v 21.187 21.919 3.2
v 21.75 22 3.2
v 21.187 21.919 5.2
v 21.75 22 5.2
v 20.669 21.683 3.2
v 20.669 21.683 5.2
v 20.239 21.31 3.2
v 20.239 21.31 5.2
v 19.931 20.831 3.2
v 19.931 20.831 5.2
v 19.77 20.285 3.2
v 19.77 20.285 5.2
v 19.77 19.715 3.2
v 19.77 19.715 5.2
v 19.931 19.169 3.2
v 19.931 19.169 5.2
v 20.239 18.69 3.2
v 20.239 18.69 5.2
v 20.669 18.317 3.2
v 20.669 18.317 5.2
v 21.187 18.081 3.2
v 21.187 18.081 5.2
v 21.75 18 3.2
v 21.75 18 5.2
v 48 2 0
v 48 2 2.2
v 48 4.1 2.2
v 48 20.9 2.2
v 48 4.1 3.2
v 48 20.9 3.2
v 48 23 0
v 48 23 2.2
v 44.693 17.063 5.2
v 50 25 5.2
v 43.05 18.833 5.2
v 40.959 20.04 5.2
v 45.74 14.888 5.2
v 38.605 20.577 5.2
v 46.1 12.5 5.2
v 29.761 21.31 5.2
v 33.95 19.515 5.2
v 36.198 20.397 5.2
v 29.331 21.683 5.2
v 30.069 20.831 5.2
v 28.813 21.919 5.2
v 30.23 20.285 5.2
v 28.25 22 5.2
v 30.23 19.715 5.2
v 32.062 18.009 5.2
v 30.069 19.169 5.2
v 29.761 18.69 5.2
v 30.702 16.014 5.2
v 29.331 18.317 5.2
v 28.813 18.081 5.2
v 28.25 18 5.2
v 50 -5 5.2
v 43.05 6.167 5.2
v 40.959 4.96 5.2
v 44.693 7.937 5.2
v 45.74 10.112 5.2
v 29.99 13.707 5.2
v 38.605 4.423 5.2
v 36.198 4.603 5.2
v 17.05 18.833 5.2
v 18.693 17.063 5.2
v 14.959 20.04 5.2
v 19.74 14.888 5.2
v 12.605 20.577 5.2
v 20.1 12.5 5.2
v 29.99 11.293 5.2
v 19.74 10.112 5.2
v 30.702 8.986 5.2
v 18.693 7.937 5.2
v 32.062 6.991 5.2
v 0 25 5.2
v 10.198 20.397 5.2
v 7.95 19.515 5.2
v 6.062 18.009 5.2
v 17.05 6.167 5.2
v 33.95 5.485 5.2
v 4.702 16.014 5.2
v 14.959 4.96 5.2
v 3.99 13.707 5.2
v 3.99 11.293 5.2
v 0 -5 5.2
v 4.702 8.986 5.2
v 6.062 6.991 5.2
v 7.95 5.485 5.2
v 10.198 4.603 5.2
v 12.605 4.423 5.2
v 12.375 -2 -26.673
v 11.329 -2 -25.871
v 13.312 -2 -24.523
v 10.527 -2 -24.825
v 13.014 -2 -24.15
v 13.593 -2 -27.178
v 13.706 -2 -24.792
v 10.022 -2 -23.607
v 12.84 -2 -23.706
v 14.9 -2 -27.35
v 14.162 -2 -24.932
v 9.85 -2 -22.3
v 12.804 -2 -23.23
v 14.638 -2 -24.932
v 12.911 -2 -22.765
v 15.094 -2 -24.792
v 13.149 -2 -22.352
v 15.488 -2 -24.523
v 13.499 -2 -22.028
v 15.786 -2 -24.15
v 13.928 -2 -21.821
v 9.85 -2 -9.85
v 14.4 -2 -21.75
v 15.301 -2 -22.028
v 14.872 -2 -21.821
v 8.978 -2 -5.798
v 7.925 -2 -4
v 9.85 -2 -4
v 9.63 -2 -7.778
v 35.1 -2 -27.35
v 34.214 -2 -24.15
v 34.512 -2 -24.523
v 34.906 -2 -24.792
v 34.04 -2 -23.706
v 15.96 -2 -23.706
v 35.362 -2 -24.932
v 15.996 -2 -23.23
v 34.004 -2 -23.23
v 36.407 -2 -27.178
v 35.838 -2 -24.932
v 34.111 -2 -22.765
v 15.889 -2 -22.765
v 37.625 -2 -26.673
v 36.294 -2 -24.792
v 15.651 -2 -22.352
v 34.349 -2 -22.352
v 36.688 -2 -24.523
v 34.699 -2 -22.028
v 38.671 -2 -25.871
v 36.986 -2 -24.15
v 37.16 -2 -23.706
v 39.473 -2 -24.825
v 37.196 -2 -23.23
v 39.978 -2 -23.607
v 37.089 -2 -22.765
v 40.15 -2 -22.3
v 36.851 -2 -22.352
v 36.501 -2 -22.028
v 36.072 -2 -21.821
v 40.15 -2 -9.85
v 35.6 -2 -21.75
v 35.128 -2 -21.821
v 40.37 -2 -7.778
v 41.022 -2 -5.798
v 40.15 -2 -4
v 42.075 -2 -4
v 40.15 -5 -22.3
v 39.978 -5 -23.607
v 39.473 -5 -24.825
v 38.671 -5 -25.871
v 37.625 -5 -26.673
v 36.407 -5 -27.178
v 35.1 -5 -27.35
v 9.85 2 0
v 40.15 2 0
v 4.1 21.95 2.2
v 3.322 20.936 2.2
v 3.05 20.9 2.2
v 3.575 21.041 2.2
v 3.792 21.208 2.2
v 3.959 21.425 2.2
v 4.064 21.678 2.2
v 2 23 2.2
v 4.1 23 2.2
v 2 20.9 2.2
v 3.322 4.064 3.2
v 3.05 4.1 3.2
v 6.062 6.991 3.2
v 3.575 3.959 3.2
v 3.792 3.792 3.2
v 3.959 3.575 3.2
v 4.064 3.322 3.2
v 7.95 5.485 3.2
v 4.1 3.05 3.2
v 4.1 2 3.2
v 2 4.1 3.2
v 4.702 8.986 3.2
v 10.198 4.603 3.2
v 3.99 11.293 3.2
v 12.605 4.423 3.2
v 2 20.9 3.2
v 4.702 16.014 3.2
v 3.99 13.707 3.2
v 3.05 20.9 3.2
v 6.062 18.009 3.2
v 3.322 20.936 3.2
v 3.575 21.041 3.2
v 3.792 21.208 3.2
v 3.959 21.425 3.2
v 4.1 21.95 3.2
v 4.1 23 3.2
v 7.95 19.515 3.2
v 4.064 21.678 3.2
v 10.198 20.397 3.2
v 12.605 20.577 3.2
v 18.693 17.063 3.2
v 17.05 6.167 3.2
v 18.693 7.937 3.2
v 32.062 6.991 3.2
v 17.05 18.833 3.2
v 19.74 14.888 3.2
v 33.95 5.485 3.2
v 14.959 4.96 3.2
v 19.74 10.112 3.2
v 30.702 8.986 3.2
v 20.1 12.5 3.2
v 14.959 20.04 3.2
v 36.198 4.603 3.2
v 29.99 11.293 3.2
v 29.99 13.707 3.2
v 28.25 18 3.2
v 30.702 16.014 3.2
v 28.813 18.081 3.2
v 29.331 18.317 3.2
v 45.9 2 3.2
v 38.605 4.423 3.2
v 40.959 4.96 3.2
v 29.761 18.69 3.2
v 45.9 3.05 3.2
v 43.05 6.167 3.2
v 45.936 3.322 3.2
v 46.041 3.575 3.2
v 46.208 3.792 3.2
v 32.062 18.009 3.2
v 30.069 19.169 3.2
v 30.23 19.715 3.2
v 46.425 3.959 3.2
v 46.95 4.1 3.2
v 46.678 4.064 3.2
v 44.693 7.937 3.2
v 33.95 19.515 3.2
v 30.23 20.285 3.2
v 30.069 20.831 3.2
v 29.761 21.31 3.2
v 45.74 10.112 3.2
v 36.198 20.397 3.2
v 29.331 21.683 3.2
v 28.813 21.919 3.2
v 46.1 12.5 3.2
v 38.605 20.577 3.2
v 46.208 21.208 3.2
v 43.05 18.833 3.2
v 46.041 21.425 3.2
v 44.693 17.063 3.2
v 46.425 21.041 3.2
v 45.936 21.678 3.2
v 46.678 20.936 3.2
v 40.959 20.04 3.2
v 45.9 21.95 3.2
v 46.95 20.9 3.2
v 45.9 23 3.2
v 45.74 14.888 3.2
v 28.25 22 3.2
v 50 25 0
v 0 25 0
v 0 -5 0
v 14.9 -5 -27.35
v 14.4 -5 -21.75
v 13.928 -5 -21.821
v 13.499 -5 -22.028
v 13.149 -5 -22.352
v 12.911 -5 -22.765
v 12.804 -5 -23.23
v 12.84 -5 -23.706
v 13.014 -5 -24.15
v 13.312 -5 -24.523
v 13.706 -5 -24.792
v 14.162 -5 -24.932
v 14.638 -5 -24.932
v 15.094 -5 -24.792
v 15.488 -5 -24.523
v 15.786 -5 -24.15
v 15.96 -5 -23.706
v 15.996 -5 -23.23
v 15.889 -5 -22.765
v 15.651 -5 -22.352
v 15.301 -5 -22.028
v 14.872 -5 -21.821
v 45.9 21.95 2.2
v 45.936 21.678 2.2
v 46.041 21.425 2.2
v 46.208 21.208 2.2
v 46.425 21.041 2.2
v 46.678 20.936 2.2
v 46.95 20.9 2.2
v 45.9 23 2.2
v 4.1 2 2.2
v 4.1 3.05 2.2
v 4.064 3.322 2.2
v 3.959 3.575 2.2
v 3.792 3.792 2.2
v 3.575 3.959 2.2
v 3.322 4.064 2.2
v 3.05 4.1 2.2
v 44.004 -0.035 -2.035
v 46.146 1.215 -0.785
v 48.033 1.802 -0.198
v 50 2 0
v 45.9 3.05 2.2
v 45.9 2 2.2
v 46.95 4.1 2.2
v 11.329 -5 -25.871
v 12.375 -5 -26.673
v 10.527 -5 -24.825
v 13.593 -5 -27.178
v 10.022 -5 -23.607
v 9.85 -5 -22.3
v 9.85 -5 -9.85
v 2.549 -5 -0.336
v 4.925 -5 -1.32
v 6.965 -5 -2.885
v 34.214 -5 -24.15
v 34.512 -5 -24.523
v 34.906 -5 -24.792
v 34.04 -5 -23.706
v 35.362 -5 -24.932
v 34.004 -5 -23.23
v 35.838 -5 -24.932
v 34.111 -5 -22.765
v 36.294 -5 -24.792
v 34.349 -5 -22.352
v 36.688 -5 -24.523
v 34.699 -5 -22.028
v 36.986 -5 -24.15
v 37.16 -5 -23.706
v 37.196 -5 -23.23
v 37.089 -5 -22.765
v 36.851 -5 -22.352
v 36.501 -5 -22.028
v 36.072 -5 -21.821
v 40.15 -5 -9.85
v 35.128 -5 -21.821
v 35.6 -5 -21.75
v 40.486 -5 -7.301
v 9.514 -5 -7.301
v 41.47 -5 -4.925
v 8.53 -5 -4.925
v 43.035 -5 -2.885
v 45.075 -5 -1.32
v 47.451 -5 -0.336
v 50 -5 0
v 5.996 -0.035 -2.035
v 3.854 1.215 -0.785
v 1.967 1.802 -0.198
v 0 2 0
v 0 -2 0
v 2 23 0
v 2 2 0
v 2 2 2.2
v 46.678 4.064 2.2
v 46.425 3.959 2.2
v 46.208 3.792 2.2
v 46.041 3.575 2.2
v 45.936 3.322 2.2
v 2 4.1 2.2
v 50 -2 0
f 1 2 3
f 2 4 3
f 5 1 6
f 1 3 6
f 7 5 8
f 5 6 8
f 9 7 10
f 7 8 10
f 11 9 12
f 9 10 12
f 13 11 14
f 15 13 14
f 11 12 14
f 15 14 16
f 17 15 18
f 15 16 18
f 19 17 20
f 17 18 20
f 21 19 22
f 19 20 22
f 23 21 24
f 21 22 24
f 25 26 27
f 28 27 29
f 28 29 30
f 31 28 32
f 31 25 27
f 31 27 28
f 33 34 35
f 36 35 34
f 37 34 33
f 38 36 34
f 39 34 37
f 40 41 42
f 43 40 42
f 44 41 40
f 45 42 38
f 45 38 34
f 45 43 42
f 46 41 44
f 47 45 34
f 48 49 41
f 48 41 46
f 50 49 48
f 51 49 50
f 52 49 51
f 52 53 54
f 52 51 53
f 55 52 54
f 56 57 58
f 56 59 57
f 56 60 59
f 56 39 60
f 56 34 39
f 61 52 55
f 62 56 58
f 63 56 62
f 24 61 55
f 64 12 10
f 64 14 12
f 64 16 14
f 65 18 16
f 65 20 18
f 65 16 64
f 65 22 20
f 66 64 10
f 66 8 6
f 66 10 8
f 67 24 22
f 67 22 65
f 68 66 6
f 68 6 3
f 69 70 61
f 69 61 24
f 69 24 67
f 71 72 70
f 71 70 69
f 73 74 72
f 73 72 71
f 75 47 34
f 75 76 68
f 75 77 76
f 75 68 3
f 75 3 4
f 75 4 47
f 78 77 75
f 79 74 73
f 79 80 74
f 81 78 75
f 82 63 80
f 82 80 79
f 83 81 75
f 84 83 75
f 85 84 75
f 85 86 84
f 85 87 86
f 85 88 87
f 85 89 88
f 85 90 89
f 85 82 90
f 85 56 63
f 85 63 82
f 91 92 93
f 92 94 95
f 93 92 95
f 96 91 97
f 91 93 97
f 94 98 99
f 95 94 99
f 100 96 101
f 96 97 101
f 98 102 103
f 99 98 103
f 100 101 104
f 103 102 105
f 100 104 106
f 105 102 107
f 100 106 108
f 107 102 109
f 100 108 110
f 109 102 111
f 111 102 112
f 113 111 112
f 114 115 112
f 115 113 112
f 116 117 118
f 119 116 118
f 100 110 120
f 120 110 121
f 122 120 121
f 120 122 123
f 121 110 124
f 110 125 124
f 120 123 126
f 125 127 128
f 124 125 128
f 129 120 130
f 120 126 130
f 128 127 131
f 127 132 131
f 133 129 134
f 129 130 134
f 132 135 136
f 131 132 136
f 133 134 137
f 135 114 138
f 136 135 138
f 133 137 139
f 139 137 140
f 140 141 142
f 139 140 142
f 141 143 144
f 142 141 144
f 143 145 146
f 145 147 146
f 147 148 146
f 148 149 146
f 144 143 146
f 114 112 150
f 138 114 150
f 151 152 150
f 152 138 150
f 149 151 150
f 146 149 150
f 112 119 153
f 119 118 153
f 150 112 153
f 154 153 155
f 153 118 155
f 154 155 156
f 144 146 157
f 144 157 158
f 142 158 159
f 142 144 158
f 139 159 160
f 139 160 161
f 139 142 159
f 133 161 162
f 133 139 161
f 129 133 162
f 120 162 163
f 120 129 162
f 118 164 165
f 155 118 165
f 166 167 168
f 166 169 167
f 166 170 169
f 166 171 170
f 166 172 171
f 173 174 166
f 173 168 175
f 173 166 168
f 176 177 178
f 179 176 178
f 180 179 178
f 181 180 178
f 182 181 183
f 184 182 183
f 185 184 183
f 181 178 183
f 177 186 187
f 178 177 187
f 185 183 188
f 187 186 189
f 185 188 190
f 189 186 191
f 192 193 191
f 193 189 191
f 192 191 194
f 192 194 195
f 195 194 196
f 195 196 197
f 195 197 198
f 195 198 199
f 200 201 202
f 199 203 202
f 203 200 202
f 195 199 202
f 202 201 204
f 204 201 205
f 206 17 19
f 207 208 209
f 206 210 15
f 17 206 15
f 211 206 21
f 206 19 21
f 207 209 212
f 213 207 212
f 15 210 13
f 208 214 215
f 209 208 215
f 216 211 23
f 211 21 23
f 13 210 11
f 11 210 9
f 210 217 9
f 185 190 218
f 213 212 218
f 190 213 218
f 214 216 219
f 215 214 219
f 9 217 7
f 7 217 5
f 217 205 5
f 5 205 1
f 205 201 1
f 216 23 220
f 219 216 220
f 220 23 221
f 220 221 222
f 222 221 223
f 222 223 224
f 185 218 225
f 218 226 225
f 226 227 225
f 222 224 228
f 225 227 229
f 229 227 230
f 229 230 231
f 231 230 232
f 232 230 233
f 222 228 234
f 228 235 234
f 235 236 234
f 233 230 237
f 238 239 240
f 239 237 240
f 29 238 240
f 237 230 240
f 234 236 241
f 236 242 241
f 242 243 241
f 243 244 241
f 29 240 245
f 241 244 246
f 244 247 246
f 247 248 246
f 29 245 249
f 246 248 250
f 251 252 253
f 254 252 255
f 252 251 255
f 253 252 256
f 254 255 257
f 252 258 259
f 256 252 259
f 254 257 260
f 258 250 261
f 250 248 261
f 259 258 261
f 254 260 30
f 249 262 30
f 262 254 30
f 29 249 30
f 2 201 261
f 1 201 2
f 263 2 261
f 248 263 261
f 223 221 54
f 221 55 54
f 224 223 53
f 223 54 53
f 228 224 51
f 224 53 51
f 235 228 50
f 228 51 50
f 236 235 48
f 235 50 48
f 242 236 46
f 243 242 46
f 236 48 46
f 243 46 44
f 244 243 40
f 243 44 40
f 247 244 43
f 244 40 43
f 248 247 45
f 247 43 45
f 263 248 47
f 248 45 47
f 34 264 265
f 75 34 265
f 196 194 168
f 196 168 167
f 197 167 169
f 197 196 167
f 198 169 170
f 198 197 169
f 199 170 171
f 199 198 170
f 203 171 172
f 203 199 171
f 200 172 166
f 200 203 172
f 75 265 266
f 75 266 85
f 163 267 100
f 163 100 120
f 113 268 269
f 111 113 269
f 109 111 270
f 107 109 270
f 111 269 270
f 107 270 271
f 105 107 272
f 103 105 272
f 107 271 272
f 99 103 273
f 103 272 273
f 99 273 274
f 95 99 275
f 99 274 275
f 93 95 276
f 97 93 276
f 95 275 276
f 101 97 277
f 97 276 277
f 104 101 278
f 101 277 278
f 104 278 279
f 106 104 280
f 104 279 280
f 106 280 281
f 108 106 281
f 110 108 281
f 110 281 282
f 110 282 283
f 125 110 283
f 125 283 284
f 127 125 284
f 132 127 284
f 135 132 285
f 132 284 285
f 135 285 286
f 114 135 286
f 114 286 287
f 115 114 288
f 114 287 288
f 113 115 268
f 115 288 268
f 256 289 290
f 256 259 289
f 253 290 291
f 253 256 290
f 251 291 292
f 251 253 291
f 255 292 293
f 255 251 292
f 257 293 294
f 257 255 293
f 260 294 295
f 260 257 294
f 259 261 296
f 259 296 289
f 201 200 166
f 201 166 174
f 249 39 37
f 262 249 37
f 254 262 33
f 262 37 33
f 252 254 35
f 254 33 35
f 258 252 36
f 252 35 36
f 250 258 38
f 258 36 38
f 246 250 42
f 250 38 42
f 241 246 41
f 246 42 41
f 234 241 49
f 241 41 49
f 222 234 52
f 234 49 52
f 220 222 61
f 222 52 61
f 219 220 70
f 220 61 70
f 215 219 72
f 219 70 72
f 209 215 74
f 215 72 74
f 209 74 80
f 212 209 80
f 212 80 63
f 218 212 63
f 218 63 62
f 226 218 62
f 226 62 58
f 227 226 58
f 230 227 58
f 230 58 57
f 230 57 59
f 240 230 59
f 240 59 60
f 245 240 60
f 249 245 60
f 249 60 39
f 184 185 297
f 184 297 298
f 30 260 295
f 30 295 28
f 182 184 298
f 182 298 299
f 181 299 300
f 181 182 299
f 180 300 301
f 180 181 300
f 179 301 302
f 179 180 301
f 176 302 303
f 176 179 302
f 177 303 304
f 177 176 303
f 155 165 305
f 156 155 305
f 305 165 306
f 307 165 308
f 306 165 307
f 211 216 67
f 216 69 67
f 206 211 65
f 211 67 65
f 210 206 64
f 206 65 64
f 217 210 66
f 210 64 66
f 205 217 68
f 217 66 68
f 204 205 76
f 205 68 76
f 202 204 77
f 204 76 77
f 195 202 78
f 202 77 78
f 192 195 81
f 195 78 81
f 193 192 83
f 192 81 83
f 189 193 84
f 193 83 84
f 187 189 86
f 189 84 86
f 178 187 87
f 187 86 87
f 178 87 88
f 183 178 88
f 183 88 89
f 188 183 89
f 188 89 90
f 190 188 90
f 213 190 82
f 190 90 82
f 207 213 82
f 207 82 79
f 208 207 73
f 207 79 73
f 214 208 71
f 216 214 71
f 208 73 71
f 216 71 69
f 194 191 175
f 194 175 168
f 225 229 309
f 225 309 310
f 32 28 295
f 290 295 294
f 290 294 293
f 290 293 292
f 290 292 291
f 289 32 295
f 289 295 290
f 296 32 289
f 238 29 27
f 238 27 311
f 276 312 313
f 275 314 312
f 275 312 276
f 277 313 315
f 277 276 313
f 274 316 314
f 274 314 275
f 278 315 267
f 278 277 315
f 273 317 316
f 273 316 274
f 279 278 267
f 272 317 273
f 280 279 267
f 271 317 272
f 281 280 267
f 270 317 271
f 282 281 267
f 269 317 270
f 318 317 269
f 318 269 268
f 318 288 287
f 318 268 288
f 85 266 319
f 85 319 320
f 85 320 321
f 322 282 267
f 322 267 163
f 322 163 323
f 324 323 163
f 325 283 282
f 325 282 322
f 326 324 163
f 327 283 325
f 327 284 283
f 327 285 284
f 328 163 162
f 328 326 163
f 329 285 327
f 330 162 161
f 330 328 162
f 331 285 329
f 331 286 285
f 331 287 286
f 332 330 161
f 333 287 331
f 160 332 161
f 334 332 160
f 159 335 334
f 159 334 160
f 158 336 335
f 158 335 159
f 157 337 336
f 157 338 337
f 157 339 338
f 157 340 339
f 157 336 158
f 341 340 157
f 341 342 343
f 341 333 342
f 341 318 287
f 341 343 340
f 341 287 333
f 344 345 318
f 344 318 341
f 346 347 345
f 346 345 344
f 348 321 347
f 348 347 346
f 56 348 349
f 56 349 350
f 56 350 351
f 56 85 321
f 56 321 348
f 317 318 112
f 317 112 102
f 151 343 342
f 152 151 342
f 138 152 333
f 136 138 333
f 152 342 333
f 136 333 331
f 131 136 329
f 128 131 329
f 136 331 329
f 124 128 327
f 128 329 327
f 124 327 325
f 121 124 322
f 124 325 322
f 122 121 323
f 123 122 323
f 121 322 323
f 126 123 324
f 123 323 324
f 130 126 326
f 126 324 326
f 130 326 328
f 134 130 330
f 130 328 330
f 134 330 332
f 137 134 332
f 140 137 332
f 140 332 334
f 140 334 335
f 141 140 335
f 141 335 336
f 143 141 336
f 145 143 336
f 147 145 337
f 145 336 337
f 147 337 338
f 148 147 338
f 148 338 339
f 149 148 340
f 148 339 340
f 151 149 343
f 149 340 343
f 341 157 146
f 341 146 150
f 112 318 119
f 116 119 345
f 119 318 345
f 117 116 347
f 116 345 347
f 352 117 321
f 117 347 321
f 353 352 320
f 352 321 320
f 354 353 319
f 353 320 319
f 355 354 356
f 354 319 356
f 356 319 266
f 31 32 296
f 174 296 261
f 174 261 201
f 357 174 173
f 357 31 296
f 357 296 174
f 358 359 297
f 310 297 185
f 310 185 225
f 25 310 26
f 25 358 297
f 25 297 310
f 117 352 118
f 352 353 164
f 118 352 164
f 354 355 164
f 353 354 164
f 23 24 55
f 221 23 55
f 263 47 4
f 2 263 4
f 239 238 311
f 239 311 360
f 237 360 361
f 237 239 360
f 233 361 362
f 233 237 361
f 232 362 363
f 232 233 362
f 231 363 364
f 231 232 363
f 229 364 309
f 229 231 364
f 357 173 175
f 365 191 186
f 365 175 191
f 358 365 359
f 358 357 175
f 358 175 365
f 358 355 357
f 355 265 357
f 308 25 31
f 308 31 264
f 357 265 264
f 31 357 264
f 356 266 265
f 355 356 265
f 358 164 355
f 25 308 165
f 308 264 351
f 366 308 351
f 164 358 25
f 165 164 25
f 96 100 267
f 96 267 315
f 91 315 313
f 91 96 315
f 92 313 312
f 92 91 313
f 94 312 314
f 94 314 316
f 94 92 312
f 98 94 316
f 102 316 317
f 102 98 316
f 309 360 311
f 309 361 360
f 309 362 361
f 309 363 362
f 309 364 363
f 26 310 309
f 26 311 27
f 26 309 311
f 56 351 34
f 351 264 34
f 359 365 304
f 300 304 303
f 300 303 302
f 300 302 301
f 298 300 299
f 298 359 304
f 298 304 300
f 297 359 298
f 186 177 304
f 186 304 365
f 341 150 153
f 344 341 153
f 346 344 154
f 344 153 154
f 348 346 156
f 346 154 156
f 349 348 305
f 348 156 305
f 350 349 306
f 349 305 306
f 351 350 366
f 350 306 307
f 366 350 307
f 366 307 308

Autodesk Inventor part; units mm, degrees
ref_plane "YZ Plane" through (0, 0, 0) normal (1, 0, 0) x (0, 1, 0)
sketch "Эскиз1" plane through (0, 0, 0) normal (0, 0, 1) x (1, 0, 0)
  line L0 (0, 0) -> (50, 0)
  line L1 (50, 0) -> (50, 25)
  line L2 (50, 25) -> (0, 25)
  line L3 (0, 25) -> (0, 0)
  dimension "d0" = 50
  dimension "d1" = 25
extrude "Выдавливание1" add sketch "Эскиз1" along normal blind 5.2
shell "Оболочка1" thickness 2 removed faces 1 at (16.6667, 16.6667, 0)
sketch "Эскиз2" plane through (0, 0, 5.2) normal (0, 0, 1) x (1, 0, 0)
  line L0 (50, 25) -> (0, 25) projected
  line L1 (25, 25) -> (25, 0)
  line L2 (0, 0) -> (50, 0) projected
  line L3 (25, 12.5) -> (12, 12.5)
  line L4 (0, 25) -> (0, 0) projected
  circle A0 centre (12, 12.5) radius 8.1
  circle A1 centre (38, 12.5) radius 8.1
  line L5 (25, 25) -> (25, 20)
  line L6 (21.75, 20) -> (28.25, 20) construction
  line L7 (21.75, 18) -> (28.25, 18)
  line L8 (28.25, 22) -> (21.75, 22)
  arc A2 (21.75, 22) -> (21.75, 18) centre (21.75, 20) ccw
  arc A3 (28.25, 18) -> (28.25, 22) centre (28.25, 20) ccw
  point P0 (25, 18)
  point P1 (25, 22)
  dimension "d5" = 13
  dimension "d6" = 16.2
  dimension "d9" = 5
  dimension "d10" = 3.25
  dimension "d11" = 4
extrude "Выдавливание2" cut sketch "Эскиз2" against normal through all contours L8 A3 L7 L1 | L1 L7 A2 L8 | A0 | A1
sketch "Эскиз5" plane through (48, 23, 3.2) normal (0, 0, -1) x (-1, 0, 0)
  line L0 (0, 0) -> (1.05, 0)
  line L1 (0, 0) -> (46, 0) projected
  line L2 (1.05, 0) -> (1.05, -1.05)
  circle A0 centre (1.05, -1.05) radius 1.05
  line L3 (2.1, -2.1) -> (0, -2.1)
  line L4 (0, -2.1) -> (0, 0)
  line L5 (0, 0) -> (2.1, 0)
  line L6 (2.1, 0) -> (2.1, -2.1)
  line L7 (2.1, -2.1) -> (0, 0) construction
  line L8 (0, -2.1) -> (2.1, 0) construction
  point P0 (48, -23)
  point P1 (1.05, -2.1)
  point P2 (2.1, -1.05)
  dimension "d17" = 1.05
  dimension "d18" = 1.05
extrude "Выдавливание4" add sketch "Эскиз5" along normal blind 1 contours L0 A0 L4 | L1 L6 A0 | A0 | A0 L3 L4
ref_plane "РабПлоскость1" through (25, 2, 0) normal (1, 0, 0) x (0, 0, -1)
ref_plane "РабПлоскость2" through (2, 12.5, 0) normal (0, -1, 0) x (1, 0, 0)
mirror "Зеркальное отражение1" about plane through (2, 12.5, 0) normal (0, -1, 0) of "Выдавливание4"
mirror "Зеркальное отражение2" about plane through (25, 2, 0) normal (1, 0, 0) of "Выдавливание4", "Зеркальное отражение1"
sketch "Эскиз19" plane through (0, 0, 0) normal (0, -1, 0) x (1, 0, 0)
  line L0 (0, 0) -> (50, 0) projected
  line L1 (50, 0) -> (50, 5.2) projected
  line L2 (0, 5.2) -> (50, 5.2) projected
  line L3 (0, 0) -> (0, 5.2) projected
extrude "Выдавливание14" add sketch "Эскиз19" along normal blind 5
sketch "Эскиз17" plane through (0, -5, 0) normal (0, -1, 0) x (1, 0, 0)
  line L0 (40.15, 5.2) -> (9.85, 5.2)
  line L1 (9.85, 5.2) -> (9.85, -27.35)
  line L2 (9.85, -27.35) -> (40.15, -27.35)
  line L3 (40.15, -27.35) -> (40.15, 5.2)
  line L4 (50, 5.2) -> (0, 5.2) projected
  point P0 (0, 0)
  point P1 (25, 5.2)
  dimension "d77" = 30.3
  dimension "d78" = 32.55
extrude "Выдавливание13" add sketch "Эскиз17" against normal blind 3
sketch "Эскиз18" plane through (45.9, 2, 2.2) normal (0, 1, 0) x (1, 0, 0)
  line L0 (-10.3, 25.55) -> (-31.5, 25.55)
  line L1 (-20.9, 25.55) -> (-20.9, 29.55)
  line L2 (-36.05, 29.55) -> (-5.75, 29.55) projected
  point P0 (-45.9, 2.2)
  dimension "d81" = 4
  dimension "d82" = 21.2
hole "Отверстие4" at (35.6, 2, -23.35) at (14.4, 2, -23.35) direction (0, -1, 0) diameter 3.2 end through all
fillet "Сопряжение4" radius 5.05 2 edges at (40.15, -3.5, -27.35) (9.85, -3.5, -27.35)
fillet "Сопряжение5" radius 9.85 2 edges at (40.15, -3.5, 0) (9.85, -3.5, 0)
chamfer "Фаска1" distance 4 angle 45 2 edges at (45.075, -2, 0) (4.9251, -2, 0)
properties part number "Крепление ультрасоника заднее"
